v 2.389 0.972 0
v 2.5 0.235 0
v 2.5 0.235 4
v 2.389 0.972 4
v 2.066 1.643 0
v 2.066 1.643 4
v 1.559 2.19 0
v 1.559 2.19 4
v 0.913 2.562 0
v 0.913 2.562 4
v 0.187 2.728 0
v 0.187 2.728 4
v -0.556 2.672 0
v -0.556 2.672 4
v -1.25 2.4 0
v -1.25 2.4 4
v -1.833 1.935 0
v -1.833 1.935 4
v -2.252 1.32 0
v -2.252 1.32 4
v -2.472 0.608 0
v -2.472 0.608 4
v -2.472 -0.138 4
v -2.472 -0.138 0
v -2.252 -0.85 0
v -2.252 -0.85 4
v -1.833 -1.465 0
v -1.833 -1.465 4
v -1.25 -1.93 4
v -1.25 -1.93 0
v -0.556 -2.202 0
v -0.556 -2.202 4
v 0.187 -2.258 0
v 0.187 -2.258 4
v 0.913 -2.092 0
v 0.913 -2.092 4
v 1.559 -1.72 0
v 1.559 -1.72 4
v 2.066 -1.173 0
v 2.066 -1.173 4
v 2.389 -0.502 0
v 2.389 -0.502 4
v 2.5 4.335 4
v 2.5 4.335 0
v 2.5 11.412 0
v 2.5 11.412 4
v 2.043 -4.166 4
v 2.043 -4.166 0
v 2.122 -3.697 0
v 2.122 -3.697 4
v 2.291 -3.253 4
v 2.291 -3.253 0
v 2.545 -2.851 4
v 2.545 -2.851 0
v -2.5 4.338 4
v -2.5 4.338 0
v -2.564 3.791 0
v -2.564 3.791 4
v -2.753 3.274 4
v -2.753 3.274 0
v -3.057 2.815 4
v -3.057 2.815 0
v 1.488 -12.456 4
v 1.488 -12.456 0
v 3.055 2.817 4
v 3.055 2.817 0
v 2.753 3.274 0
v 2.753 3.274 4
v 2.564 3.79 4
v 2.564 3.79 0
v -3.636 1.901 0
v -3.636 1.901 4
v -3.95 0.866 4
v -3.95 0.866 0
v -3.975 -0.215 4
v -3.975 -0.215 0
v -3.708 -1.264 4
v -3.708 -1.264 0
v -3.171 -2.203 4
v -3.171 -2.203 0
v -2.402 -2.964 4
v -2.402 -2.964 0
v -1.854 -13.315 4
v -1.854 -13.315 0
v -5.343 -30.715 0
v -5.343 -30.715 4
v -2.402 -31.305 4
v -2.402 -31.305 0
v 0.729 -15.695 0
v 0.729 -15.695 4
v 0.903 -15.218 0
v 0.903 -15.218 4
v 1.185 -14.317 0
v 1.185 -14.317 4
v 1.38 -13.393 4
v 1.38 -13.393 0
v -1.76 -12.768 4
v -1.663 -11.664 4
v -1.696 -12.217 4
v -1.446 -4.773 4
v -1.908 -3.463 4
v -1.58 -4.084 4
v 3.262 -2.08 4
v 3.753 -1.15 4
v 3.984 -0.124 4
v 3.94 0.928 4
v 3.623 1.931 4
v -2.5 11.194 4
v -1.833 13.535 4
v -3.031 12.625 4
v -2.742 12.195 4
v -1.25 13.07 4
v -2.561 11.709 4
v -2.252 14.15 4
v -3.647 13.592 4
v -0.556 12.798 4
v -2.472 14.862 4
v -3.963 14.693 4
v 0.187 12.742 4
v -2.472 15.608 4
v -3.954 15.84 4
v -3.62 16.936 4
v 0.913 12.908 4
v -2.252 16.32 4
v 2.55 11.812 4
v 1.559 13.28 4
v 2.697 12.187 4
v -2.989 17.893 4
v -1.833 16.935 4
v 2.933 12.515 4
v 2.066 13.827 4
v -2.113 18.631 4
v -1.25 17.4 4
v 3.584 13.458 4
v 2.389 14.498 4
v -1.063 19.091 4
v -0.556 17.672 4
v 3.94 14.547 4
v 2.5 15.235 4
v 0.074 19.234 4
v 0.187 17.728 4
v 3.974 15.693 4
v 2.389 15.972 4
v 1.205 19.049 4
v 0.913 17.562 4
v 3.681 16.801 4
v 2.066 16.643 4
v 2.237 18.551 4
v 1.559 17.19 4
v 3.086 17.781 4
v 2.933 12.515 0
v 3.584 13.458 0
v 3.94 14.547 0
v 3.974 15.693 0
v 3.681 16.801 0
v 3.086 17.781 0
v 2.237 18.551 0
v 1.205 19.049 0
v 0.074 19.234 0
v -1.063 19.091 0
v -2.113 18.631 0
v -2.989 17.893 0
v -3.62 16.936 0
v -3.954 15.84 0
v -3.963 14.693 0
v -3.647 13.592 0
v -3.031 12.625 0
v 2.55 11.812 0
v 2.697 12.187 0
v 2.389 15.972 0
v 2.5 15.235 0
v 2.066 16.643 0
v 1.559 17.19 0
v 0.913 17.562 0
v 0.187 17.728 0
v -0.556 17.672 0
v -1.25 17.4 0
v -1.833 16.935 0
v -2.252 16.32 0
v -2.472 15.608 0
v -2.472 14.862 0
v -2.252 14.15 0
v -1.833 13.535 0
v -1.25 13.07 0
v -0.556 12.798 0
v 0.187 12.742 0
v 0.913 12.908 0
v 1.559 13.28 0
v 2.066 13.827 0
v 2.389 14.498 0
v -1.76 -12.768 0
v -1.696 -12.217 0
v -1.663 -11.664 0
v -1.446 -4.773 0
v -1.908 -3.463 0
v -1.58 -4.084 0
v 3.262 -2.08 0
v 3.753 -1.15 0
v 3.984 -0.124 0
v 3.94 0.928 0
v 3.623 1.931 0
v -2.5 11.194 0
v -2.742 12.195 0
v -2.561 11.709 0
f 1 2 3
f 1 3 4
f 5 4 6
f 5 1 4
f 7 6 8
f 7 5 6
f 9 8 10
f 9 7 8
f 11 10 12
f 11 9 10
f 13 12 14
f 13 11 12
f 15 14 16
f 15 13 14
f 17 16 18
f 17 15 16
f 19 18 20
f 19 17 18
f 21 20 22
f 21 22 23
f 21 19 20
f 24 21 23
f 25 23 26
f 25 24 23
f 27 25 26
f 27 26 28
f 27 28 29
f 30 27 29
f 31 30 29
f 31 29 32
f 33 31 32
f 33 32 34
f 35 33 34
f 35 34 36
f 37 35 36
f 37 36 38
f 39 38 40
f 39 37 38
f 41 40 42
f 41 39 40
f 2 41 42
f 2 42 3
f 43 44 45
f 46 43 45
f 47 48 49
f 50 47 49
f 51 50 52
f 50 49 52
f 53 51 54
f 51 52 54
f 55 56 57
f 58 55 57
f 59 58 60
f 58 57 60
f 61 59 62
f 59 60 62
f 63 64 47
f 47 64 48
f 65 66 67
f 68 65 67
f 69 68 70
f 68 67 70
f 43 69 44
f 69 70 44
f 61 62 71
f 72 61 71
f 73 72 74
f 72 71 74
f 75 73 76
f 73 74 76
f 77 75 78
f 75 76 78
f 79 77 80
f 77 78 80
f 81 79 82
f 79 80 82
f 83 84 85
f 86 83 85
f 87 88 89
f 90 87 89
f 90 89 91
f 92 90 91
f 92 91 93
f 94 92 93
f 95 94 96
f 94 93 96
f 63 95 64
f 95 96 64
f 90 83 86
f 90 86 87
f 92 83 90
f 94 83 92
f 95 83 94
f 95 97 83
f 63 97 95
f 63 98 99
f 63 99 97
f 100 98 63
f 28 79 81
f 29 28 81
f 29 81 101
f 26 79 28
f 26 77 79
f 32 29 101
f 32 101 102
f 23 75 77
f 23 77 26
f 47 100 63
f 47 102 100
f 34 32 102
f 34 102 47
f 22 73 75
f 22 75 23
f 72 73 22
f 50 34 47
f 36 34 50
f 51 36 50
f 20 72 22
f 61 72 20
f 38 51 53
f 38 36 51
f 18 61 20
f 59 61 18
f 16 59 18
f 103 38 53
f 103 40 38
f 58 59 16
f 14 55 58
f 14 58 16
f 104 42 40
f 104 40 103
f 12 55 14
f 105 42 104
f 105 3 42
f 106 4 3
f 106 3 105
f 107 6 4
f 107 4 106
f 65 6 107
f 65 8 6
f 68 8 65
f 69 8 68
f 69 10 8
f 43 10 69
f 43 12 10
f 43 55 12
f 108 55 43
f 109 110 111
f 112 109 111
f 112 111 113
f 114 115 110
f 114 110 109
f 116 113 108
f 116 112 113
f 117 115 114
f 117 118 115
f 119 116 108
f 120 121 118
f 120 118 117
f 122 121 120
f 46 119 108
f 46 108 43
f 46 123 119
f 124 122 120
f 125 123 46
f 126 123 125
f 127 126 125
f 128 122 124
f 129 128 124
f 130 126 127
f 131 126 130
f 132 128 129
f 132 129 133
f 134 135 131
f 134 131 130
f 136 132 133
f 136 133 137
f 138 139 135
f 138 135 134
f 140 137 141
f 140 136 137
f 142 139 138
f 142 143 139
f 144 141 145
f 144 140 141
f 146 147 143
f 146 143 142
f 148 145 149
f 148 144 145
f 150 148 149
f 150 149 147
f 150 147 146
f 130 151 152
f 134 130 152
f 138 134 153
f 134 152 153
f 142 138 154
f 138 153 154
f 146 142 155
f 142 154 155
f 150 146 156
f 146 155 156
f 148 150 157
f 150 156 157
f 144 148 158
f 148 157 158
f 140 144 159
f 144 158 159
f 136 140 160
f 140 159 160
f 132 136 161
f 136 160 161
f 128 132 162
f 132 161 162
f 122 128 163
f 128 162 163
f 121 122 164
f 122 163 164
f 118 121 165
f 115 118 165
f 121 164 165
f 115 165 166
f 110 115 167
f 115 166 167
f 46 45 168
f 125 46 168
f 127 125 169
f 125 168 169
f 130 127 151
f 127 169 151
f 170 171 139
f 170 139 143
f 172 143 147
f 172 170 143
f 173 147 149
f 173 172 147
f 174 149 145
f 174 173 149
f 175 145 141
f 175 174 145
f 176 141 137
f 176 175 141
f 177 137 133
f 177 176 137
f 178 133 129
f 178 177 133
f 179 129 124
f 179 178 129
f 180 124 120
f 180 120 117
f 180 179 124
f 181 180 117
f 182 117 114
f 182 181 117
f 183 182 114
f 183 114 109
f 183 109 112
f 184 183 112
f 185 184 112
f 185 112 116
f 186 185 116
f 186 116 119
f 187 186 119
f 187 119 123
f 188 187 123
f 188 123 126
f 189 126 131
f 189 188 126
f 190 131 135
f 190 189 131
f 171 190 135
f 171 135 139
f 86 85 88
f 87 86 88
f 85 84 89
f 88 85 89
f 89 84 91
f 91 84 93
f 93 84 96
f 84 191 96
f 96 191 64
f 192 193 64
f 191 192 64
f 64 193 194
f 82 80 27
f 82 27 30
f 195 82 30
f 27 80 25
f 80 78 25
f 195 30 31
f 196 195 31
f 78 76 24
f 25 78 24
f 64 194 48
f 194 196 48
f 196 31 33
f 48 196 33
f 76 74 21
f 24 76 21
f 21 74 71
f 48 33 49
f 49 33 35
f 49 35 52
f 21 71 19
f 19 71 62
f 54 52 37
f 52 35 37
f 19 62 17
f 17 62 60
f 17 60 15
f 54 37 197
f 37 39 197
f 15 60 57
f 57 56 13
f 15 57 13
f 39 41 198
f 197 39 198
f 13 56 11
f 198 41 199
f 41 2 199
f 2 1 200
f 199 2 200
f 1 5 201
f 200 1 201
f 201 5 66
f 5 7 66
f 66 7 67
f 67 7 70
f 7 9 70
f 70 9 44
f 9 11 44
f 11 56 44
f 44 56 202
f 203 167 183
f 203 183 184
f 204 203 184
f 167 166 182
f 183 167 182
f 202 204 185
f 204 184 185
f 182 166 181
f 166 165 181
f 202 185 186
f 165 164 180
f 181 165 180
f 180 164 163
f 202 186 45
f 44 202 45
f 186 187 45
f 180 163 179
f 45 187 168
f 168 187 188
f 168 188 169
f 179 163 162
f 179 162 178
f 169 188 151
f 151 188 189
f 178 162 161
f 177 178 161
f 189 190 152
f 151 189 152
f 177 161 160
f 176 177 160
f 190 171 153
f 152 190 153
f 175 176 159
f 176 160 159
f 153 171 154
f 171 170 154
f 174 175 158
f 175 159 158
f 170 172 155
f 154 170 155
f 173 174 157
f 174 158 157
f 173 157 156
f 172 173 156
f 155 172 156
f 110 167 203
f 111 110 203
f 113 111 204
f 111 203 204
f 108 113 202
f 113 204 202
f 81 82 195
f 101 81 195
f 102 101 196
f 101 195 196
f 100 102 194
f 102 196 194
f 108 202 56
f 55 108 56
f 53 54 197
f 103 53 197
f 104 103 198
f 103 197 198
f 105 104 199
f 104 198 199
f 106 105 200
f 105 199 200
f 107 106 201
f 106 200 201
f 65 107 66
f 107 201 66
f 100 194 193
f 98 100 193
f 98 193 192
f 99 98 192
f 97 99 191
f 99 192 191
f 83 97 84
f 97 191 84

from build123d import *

# Parameters (mm, degrees)
SKETCH_1_R      = 2.5
EXTRUDE_1_DEPTH = 4


with BuildPart() as part:
    # 草图1 → 凸台-拉伸1 (new body)
    with BuildSketch(Plane.XY):
        with BuildLine():
            Line((1.48766526, -12.45557816), (2.043160586, -4.166239224))
            ThreePointArc((2.043160586, -4.166239224), (2.195630301, -3.470719779), (2.545454545, -2.850544554))
            ThreePointArc((2.545454545, -2.850544554), (3.98389954, -0.123518663), (3.05546146, 2.81651483))
            ThreePointArc((3.05546146, 2.81651483), (2.643225677, 3.526362386), (2.5, 4.334637277))
            Line((2.5, 4.334637277), (2.5, 11.411754756))
            ThreePointArc((2.5, 11.411754756), (2.612083111, 12.004318679), (2.932846289, 12.515009985))
            ThreePointArc((2.932846289, 12.515009985), (0.073861123, 19.234330318), (-3.03128037, 12.625158038))
            ThreePointArc((-3.03128037, 12.625158038), (-2.637104468, 11.957199077), (-2.5, 11.19382094))
            Line((-2.5, 11.19382094), (-2.5, 4.337916945))
            ThreePointArc((-2.5, 4.337916945), (-2.643562436, 3.527132911), (-3.056792932, 2.814938078))
            ThreePointArc((-3.056792932, 2.814938078), (-3.974554812, -0.215447508), (-2.401879608, -2.963577121))
            ThreePointArc((-2.401879608, -2.963577121), (-1.721128393, -3.761289924), (-1.445511633, -4.773121596))
            Line((-1.445511633, -4.773121596), (-1.663239971, -11.663933953))
            ThreePointArc((-1.663239971, -11.663933953), (-1.724028802, -12.493204072), (-1.853501284, -13.314557278))
            Line((-1.853501284, -13.314557278), (-5.343304788, -30.714907241))
            Line((-5.343304788, -30.714907241), (-2.401879608, -31.304837669))
            Line((-2.401879608, -31.304837669), (0.728861428, -15.694792688))
            Line((0.728861428, -15.694792688), (0.903082999, -15.217807594))
            ThreePointArc((0.903082999, -15.217807594), (1.293351086, -13.857428153), (1.48766526, -12.45557816))
        make_face()
        with Locations((0, 0.235012309)):
            Circle(SKETCH_1_R, mode=Mode.SUBTRACT)
        with Locations((0, 15.235012309)):
            Circle(SKETCH_1_R, mode=Mode.SUBTRACT)
    extrude(amount=EXTRUDE_1_DEPTH)


solid = part.part
